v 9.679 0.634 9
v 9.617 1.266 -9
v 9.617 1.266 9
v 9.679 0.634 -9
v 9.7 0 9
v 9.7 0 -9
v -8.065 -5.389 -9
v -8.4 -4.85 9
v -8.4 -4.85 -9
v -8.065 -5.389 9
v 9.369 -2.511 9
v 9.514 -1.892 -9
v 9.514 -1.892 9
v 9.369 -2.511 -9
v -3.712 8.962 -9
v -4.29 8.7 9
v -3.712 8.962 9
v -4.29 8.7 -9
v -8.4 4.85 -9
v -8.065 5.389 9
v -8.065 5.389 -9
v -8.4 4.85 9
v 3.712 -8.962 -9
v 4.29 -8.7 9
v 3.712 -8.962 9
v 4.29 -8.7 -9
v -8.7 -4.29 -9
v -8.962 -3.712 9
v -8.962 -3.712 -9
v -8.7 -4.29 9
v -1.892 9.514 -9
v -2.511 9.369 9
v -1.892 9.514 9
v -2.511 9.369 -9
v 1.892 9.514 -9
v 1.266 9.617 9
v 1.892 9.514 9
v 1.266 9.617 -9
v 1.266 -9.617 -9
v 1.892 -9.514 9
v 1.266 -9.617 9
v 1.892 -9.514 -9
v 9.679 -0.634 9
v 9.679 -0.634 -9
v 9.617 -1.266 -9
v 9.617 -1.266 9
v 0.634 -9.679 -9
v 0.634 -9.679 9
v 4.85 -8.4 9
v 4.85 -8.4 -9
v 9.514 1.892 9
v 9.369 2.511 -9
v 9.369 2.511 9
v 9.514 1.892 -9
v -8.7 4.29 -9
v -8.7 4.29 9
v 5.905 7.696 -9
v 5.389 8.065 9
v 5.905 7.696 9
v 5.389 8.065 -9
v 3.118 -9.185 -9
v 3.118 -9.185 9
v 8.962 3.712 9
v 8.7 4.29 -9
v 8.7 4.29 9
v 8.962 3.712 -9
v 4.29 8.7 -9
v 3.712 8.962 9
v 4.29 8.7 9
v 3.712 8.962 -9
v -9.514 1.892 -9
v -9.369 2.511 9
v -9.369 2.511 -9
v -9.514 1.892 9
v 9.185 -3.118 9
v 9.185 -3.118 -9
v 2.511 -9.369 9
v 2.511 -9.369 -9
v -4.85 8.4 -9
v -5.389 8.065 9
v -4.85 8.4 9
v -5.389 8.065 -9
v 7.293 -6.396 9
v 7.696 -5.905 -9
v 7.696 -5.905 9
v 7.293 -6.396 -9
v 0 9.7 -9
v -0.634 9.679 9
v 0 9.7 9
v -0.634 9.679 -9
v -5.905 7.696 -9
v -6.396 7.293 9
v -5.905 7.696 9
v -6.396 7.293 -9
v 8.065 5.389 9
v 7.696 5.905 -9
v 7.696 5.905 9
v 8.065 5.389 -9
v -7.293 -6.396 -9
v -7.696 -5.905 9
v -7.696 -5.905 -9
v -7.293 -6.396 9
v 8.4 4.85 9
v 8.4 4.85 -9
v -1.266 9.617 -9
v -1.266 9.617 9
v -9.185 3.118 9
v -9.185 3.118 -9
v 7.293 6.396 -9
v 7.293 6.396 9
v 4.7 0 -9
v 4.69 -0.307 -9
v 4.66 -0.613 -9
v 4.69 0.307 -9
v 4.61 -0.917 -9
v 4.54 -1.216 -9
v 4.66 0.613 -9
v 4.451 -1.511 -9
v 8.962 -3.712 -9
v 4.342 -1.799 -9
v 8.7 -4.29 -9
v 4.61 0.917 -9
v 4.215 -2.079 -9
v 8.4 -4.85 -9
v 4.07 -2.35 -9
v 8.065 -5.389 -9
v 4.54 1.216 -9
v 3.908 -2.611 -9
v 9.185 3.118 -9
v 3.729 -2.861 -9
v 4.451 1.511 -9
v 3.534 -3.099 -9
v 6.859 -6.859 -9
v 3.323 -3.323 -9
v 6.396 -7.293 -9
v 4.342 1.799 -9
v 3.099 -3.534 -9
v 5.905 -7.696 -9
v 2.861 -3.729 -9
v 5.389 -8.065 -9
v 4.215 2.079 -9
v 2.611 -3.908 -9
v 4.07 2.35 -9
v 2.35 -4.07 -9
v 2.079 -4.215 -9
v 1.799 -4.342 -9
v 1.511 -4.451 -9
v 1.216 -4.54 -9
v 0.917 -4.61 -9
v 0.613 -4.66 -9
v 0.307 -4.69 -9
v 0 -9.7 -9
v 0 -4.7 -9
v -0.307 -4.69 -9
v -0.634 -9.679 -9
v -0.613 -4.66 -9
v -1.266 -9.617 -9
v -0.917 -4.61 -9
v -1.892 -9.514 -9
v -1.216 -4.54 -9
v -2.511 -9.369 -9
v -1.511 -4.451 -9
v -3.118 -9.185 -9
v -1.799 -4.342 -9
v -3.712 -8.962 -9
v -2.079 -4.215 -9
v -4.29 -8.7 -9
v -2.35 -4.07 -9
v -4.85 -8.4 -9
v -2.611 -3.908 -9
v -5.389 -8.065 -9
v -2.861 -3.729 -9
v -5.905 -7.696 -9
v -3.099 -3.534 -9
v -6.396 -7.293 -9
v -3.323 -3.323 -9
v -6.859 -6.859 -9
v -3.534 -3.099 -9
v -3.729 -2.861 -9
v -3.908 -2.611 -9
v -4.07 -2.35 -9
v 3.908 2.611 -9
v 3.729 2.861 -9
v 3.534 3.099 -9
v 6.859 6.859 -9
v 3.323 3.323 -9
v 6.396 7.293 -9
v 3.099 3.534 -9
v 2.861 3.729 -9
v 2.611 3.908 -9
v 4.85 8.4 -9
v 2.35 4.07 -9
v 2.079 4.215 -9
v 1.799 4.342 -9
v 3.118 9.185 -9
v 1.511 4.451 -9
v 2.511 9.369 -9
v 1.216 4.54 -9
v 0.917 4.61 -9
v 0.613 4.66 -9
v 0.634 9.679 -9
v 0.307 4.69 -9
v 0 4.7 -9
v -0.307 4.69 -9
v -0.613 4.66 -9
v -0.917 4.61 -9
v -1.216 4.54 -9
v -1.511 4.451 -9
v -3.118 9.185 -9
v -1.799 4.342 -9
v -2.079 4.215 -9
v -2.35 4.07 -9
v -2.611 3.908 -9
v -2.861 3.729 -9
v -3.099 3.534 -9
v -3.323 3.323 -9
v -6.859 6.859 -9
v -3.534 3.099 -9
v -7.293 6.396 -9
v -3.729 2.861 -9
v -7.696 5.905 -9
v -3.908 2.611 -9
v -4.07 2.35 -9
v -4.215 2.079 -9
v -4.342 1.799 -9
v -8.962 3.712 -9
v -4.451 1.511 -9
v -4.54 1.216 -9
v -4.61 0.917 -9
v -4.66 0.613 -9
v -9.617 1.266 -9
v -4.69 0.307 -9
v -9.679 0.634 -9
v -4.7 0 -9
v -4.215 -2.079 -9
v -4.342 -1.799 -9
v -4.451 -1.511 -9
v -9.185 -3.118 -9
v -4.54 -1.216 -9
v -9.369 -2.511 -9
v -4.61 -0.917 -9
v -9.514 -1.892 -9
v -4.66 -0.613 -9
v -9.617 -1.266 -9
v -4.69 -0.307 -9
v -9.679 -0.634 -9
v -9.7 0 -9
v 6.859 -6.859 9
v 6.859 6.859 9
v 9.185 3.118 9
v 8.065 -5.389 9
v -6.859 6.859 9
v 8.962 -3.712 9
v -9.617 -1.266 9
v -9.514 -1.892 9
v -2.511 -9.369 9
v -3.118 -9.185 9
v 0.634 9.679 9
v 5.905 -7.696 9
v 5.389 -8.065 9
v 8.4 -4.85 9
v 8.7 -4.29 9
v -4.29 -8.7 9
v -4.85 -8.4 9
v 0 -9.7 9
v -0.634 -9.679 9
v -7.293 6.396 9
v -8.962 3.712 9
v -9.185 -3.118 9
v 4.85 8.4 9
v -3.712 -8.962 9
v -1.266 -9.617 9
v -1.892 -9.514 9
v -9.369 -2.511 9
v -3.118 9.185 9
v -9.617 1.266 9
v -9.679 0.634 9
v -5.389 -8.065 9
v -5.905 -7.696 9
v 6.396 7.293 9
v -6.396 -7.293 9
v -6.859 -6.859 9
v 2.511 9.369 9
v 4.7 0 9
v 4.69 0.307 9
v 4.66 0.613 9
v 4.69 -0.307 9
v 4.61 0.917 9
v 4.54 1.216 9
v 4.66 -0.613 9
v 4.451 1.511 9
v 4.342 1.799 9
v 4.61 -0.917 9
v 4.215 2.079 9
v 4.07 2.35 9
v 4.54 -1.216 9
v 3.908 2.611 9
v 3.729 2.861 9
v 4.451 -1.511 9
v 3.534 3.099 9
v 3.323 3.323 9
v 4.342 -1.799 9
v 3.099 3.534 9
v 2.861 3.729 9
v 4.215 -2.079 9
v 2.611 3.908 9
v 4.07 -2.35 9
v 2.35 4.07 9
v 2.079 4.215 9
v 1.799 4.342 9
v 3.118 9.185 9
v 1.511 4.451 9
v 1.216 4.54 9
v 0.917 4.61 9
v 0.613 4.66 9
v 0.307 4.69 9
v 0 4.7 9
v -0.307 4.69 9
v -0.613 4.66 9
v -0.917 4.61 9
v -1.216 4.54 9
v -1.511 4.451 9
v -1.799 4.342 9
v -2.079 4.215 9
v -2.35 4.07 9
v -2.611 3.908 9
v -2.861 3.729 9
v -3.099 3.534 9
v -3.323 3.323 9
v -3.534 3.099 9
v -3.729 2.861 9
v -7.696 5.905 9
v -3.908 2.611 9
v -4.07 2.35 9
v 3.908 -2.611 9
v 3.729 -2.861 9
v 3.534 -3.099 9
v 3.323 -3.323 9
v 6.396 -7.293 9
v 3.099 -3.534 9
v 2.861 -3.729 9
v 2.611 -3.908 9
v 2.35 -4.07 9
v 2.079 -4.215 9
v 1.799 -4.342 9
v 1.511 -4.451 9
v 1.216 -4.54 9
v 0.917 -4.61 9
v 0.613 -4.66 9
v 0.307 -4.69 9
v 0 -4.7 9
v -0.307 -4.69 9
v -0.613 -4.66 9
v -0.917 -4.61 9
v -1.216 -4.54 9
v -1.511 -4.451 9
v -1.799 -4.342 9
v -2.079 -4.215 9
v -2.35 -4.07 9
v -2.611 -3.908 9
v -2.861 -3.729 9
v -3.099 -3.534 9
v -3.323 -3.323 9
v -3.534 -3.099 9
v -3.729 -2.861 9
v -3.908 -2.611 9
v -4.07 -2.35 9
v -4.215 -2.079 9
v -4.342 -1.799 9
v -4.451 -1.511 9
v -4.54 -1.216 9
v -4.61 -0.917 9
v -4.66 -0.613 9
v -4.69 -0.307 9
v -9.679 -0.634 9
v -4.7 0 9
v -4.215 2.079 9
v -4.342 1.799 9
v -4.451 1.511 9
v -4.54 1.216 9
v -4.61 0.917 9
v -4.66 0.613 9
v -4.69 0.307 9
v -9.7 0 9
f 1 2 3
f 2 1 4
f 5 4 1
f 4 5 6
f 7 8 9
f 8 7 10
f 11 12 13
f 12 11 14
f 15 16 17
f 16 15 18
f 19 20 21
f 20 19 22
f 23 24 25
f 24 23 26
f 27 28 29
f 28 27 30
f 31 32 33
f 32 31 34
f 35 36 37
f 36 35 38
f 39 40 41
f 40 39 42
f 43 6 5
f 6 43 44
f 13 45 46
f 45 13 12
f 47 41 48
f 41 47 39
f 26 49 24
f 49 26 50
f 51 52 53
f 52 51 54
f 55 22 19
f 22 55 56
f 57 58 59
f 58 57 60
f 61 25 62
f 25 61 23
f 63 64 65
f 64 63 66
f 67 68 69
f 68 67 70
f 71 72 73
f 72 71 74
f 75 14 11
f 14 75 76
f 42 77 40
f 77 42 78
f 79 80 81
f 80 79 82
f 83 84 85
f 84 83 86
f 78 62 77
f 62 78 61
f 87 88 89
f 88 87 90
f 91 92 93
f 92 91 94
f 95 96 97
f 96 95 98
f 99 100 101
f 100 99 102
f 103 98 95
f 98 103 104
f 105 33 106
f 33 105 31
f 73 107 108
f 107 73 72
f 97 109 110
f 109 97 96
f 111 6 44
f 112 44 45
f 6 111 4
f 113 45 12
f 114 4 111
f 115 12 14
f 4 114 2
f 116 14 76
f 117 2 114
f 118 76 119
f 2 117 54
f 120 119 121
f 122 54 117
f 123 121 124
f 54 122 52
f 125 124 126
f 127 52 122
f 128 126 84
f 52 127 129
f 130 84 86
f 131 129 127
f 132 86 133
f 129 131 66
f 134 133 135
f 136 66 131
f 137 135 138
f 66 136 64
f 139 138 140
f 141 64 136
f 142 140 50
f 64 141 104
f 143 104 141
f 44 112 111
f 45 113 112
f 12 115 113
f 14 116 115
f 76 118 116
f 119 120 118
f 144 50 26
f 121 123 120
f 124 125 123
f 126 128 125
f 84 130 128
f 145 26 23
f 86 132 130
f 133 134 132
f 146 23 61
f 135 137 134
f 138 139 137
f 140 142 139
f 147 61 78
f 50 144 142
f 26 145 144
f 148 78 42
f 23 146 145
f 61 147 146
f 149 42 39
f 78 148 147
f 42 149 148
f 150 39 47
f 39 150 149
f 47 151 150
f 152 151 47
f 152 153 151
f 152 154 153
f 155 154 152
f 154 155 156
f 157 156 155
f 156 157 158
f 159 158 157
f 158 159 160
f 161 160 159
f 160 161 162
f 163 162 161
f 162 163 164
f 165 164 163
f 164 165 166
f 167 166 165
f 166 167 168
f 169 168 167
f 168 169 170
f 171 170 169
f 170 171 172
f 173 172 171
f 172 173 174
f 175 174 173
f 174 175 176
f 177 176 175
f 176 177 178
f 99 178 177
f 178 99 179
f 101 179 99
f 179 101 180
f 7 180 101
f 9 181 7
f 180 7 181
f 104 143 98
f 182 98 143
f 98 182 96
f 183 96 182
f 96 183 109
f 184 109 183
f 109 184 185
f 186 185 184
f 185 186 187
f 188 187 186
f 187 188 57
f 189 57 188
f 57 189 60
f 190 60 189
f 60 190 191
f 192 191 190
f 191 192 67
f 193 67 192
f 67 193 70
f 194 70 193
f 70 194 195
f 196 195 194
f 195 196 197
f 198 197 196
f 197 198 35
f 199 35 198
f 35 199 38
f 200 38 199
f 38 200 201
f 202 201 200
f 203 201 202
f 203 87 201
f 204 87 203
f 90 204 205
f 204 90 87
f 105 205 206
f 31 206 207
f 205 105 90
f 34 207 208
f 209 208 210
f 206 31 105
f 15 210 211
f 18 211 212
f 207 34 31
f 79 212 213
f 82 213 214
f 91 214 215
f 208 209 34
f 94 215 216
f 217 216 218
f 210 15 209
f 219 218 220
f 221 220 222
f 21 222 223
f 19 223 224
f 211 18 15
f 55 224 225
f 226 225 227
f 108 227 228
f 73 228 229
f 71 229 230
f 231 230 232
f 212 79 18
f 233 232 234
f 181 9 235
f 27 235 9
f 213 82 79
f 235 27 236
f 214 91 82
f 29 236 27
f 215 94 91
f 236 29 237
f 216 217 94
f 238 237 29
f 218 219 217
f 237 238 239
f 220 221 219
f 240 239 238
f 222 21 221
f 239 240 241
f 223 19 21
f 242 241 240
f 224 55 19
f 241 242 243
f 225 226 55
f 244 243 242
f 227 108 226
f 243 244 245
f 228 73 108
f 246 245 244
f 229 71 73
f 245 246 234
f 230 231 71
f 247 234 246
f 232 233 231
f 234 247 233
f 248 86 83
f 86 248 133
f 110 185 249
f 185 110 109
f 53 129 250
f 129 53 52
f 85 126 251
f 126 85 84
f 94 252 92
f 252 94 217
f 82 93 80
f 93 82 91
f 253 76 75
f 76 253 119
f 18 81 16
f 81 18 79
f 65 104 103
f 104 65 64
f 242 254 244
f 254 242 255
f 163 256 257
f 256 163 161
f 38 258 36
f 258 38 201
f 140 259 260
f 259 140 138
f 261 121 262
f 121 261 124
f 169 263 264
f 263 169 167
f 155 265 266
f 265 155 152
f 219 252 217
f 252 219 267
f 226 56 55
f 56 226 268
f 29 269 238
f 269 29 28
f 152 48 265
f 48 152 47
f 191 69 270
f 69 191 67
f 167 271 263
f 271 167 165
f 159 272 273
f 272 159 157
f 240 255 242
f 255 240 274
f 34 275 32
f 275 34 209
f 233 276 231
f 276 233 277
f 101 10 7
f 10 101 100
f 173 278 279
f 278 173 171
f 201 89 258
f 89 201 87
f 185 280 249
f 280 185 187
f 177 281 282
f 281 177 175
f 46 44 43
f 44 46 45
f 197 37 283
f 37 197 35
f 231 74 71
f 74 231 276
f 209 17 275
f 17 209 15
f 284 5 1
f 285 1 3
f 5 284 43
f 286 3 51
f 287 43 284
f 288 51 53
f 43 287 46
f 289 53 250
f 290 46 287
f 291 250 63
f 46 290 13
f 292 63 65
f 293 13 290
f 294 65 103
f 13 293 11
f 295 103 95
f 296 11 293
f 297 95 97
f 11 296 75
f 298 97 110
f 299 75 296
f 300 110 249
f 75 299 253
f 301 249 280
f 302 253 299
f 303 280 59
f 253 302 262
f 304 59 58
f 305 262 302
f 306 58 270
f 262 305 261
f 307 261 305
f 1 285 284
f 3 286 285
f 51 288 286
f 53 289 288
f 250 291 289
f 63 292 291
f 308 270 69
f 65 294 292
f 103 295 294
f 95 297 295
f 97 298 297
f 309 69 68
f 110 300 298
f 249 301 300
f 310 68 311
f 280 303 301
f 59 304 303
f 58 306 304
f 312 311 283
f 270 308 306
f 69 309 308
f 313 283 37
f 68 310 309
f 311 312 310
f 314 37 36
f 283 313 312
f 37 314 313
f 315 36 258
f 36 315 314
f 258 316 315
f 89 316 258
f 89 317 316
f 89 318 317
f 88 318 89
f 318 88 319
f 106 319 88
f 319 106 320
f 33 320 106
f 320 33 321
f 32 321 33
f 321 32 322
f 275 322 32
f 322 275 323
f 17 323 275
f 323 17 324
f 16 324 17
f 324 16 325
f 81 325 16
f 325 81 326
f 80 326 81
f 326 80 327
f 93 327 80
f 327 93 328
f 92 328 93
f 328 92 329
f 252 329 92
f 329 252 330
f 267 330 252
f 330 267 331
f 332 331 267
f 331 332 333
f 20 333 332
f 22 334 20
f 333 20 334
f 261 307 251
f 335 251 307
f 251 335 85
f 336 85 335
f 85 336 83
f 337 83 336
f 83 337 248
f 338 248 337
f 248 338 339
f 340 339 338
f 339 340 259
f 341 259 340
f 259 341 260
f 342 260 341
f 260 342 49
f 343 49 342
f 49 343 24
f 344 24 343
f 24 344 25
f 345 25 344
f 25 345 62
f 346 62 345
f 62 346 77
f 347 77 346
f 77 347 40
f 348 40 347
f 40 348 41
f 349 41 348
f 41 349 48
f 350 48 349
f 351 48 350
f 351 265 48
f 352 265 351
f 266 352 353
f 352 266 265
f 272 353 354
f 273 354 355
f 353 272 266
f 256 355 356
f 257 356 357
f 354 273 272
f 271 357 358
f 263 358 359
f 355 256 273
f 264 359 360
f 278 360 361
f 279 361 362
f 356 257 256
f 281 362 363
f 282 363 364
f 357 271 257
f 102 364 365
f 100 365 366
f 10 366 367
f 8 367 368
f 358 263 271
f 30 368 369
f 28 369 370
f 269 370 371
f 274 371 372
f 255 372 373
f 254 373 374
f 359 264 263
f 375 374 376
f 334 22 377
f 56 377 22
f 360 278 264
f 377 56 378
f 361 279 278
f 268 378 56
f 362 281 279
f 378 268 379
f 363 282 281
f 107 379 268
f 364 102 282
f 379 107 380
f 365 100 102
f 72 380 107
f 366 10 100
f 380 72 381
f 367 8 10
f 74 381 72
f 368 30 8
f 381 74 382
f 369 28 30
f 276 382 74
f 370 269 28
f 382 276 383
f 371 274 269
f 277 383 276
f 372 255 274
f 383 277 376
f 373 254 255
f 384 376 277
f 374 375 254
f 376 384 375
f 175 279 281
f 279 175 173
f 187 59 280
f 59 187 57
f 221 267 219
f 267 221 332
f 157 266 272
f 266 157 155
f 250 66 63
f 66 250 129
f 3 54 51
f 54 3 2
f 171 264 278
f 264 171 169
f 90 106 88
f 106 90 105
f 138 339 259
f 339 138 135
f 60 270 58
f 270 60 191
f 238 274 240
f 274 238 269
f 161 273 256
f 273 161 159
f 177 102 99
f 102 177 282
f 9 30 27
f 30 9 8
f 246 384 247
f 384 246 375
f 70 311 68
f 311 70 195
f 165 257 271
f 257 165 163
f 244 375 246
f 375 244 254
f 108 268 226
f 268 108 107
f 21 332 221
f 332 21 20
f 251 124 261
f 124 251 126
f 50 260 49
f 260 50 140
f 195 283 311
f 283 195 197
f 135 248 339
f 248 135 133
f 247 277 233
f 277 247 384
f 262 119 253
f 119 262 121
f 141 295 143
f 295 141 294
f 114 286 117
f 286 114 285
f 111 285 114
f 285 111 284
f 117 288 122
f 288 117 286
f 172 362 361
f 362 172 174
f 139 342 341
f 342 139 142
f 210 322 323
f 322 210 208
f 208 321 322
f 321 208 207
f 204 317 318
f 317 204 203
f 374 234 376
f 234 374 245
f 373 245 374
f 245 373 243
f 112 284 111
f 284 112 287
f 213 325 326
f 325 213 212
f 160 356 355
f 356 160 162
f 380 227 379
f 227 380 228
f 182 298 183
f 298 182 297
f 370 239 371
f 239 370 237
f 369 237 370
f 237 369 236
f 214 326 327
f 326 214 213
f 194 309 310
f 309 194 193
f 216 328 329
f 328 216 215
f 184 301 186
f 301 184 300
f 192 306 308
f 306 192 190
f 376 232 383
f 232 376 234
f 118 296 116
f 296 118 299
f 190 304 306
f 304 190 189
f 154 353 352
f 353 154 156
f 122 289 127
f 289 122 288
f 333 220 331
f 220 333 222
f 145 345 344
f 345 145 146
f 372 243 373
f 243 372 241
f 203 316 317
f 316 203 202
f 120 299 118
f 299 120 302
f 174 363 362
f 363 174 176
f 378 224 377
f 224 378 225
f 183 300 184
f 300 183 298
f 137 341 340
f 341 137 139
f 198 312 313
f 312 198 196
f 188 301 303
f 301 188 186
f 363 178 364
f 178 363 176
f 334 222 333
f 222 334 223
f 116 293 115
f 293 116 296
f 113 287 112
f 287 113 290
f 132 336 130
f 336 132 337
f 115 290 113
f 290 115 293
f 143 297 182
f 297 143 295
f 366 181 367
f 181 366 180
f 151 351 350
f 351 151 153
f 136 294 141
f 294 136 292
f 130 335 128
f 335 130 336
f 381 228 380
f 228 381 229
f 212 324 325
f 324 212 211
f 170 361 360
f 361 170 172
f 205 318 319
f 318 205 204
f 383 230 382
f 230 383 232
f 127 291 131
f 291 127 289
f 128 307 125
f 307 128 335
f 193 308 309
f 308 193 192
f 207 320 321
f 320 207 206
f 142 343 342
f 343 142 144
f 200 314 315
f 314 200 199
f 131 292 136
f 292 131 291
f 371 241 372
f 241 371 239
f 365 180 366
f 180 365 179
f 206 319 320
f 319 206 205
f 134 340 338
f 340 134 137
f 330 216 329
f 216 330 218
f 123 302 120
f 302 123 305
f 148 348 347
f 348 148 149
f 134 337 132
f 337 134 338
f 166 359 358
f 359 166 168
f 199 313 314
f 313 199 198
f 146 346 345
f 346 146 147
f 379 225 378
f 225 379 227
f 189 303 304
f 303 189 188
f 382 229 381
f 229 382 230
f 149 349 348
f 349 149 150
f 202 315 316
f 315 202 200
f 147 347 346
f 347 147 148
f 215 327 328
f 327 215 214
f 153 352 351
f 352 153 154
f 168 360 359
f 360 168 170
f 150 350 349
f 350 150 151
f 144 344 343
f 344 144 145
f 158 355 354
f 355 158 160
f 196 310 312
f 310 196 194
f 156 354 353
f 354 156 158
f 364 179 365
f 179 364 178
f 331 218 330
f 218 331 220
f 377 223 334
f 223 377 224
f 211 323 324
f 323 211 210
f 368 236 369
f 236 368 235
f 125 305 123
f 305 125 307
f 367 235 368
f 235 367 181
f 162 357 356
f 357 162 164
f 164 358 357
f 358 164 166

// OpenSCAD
// Optional spacers in case M8 bolds are long
// speedup closing winged nuts
// 4 * 2 = 8 pieces


M8=9.4;        // for easy insertion on M8 bold
  // when printed with nozzle 0.8 (and HIPS) 9.4 is necessary
   // nozzle  0.4 = 8.8= ok
Height=18;


difference()
{
cylinder(h=Height,d=M8+10,center=true,$fn=96);
 cylinder(h=Height+1,d=M8,center=true,$fn=96) ;  
    
}
